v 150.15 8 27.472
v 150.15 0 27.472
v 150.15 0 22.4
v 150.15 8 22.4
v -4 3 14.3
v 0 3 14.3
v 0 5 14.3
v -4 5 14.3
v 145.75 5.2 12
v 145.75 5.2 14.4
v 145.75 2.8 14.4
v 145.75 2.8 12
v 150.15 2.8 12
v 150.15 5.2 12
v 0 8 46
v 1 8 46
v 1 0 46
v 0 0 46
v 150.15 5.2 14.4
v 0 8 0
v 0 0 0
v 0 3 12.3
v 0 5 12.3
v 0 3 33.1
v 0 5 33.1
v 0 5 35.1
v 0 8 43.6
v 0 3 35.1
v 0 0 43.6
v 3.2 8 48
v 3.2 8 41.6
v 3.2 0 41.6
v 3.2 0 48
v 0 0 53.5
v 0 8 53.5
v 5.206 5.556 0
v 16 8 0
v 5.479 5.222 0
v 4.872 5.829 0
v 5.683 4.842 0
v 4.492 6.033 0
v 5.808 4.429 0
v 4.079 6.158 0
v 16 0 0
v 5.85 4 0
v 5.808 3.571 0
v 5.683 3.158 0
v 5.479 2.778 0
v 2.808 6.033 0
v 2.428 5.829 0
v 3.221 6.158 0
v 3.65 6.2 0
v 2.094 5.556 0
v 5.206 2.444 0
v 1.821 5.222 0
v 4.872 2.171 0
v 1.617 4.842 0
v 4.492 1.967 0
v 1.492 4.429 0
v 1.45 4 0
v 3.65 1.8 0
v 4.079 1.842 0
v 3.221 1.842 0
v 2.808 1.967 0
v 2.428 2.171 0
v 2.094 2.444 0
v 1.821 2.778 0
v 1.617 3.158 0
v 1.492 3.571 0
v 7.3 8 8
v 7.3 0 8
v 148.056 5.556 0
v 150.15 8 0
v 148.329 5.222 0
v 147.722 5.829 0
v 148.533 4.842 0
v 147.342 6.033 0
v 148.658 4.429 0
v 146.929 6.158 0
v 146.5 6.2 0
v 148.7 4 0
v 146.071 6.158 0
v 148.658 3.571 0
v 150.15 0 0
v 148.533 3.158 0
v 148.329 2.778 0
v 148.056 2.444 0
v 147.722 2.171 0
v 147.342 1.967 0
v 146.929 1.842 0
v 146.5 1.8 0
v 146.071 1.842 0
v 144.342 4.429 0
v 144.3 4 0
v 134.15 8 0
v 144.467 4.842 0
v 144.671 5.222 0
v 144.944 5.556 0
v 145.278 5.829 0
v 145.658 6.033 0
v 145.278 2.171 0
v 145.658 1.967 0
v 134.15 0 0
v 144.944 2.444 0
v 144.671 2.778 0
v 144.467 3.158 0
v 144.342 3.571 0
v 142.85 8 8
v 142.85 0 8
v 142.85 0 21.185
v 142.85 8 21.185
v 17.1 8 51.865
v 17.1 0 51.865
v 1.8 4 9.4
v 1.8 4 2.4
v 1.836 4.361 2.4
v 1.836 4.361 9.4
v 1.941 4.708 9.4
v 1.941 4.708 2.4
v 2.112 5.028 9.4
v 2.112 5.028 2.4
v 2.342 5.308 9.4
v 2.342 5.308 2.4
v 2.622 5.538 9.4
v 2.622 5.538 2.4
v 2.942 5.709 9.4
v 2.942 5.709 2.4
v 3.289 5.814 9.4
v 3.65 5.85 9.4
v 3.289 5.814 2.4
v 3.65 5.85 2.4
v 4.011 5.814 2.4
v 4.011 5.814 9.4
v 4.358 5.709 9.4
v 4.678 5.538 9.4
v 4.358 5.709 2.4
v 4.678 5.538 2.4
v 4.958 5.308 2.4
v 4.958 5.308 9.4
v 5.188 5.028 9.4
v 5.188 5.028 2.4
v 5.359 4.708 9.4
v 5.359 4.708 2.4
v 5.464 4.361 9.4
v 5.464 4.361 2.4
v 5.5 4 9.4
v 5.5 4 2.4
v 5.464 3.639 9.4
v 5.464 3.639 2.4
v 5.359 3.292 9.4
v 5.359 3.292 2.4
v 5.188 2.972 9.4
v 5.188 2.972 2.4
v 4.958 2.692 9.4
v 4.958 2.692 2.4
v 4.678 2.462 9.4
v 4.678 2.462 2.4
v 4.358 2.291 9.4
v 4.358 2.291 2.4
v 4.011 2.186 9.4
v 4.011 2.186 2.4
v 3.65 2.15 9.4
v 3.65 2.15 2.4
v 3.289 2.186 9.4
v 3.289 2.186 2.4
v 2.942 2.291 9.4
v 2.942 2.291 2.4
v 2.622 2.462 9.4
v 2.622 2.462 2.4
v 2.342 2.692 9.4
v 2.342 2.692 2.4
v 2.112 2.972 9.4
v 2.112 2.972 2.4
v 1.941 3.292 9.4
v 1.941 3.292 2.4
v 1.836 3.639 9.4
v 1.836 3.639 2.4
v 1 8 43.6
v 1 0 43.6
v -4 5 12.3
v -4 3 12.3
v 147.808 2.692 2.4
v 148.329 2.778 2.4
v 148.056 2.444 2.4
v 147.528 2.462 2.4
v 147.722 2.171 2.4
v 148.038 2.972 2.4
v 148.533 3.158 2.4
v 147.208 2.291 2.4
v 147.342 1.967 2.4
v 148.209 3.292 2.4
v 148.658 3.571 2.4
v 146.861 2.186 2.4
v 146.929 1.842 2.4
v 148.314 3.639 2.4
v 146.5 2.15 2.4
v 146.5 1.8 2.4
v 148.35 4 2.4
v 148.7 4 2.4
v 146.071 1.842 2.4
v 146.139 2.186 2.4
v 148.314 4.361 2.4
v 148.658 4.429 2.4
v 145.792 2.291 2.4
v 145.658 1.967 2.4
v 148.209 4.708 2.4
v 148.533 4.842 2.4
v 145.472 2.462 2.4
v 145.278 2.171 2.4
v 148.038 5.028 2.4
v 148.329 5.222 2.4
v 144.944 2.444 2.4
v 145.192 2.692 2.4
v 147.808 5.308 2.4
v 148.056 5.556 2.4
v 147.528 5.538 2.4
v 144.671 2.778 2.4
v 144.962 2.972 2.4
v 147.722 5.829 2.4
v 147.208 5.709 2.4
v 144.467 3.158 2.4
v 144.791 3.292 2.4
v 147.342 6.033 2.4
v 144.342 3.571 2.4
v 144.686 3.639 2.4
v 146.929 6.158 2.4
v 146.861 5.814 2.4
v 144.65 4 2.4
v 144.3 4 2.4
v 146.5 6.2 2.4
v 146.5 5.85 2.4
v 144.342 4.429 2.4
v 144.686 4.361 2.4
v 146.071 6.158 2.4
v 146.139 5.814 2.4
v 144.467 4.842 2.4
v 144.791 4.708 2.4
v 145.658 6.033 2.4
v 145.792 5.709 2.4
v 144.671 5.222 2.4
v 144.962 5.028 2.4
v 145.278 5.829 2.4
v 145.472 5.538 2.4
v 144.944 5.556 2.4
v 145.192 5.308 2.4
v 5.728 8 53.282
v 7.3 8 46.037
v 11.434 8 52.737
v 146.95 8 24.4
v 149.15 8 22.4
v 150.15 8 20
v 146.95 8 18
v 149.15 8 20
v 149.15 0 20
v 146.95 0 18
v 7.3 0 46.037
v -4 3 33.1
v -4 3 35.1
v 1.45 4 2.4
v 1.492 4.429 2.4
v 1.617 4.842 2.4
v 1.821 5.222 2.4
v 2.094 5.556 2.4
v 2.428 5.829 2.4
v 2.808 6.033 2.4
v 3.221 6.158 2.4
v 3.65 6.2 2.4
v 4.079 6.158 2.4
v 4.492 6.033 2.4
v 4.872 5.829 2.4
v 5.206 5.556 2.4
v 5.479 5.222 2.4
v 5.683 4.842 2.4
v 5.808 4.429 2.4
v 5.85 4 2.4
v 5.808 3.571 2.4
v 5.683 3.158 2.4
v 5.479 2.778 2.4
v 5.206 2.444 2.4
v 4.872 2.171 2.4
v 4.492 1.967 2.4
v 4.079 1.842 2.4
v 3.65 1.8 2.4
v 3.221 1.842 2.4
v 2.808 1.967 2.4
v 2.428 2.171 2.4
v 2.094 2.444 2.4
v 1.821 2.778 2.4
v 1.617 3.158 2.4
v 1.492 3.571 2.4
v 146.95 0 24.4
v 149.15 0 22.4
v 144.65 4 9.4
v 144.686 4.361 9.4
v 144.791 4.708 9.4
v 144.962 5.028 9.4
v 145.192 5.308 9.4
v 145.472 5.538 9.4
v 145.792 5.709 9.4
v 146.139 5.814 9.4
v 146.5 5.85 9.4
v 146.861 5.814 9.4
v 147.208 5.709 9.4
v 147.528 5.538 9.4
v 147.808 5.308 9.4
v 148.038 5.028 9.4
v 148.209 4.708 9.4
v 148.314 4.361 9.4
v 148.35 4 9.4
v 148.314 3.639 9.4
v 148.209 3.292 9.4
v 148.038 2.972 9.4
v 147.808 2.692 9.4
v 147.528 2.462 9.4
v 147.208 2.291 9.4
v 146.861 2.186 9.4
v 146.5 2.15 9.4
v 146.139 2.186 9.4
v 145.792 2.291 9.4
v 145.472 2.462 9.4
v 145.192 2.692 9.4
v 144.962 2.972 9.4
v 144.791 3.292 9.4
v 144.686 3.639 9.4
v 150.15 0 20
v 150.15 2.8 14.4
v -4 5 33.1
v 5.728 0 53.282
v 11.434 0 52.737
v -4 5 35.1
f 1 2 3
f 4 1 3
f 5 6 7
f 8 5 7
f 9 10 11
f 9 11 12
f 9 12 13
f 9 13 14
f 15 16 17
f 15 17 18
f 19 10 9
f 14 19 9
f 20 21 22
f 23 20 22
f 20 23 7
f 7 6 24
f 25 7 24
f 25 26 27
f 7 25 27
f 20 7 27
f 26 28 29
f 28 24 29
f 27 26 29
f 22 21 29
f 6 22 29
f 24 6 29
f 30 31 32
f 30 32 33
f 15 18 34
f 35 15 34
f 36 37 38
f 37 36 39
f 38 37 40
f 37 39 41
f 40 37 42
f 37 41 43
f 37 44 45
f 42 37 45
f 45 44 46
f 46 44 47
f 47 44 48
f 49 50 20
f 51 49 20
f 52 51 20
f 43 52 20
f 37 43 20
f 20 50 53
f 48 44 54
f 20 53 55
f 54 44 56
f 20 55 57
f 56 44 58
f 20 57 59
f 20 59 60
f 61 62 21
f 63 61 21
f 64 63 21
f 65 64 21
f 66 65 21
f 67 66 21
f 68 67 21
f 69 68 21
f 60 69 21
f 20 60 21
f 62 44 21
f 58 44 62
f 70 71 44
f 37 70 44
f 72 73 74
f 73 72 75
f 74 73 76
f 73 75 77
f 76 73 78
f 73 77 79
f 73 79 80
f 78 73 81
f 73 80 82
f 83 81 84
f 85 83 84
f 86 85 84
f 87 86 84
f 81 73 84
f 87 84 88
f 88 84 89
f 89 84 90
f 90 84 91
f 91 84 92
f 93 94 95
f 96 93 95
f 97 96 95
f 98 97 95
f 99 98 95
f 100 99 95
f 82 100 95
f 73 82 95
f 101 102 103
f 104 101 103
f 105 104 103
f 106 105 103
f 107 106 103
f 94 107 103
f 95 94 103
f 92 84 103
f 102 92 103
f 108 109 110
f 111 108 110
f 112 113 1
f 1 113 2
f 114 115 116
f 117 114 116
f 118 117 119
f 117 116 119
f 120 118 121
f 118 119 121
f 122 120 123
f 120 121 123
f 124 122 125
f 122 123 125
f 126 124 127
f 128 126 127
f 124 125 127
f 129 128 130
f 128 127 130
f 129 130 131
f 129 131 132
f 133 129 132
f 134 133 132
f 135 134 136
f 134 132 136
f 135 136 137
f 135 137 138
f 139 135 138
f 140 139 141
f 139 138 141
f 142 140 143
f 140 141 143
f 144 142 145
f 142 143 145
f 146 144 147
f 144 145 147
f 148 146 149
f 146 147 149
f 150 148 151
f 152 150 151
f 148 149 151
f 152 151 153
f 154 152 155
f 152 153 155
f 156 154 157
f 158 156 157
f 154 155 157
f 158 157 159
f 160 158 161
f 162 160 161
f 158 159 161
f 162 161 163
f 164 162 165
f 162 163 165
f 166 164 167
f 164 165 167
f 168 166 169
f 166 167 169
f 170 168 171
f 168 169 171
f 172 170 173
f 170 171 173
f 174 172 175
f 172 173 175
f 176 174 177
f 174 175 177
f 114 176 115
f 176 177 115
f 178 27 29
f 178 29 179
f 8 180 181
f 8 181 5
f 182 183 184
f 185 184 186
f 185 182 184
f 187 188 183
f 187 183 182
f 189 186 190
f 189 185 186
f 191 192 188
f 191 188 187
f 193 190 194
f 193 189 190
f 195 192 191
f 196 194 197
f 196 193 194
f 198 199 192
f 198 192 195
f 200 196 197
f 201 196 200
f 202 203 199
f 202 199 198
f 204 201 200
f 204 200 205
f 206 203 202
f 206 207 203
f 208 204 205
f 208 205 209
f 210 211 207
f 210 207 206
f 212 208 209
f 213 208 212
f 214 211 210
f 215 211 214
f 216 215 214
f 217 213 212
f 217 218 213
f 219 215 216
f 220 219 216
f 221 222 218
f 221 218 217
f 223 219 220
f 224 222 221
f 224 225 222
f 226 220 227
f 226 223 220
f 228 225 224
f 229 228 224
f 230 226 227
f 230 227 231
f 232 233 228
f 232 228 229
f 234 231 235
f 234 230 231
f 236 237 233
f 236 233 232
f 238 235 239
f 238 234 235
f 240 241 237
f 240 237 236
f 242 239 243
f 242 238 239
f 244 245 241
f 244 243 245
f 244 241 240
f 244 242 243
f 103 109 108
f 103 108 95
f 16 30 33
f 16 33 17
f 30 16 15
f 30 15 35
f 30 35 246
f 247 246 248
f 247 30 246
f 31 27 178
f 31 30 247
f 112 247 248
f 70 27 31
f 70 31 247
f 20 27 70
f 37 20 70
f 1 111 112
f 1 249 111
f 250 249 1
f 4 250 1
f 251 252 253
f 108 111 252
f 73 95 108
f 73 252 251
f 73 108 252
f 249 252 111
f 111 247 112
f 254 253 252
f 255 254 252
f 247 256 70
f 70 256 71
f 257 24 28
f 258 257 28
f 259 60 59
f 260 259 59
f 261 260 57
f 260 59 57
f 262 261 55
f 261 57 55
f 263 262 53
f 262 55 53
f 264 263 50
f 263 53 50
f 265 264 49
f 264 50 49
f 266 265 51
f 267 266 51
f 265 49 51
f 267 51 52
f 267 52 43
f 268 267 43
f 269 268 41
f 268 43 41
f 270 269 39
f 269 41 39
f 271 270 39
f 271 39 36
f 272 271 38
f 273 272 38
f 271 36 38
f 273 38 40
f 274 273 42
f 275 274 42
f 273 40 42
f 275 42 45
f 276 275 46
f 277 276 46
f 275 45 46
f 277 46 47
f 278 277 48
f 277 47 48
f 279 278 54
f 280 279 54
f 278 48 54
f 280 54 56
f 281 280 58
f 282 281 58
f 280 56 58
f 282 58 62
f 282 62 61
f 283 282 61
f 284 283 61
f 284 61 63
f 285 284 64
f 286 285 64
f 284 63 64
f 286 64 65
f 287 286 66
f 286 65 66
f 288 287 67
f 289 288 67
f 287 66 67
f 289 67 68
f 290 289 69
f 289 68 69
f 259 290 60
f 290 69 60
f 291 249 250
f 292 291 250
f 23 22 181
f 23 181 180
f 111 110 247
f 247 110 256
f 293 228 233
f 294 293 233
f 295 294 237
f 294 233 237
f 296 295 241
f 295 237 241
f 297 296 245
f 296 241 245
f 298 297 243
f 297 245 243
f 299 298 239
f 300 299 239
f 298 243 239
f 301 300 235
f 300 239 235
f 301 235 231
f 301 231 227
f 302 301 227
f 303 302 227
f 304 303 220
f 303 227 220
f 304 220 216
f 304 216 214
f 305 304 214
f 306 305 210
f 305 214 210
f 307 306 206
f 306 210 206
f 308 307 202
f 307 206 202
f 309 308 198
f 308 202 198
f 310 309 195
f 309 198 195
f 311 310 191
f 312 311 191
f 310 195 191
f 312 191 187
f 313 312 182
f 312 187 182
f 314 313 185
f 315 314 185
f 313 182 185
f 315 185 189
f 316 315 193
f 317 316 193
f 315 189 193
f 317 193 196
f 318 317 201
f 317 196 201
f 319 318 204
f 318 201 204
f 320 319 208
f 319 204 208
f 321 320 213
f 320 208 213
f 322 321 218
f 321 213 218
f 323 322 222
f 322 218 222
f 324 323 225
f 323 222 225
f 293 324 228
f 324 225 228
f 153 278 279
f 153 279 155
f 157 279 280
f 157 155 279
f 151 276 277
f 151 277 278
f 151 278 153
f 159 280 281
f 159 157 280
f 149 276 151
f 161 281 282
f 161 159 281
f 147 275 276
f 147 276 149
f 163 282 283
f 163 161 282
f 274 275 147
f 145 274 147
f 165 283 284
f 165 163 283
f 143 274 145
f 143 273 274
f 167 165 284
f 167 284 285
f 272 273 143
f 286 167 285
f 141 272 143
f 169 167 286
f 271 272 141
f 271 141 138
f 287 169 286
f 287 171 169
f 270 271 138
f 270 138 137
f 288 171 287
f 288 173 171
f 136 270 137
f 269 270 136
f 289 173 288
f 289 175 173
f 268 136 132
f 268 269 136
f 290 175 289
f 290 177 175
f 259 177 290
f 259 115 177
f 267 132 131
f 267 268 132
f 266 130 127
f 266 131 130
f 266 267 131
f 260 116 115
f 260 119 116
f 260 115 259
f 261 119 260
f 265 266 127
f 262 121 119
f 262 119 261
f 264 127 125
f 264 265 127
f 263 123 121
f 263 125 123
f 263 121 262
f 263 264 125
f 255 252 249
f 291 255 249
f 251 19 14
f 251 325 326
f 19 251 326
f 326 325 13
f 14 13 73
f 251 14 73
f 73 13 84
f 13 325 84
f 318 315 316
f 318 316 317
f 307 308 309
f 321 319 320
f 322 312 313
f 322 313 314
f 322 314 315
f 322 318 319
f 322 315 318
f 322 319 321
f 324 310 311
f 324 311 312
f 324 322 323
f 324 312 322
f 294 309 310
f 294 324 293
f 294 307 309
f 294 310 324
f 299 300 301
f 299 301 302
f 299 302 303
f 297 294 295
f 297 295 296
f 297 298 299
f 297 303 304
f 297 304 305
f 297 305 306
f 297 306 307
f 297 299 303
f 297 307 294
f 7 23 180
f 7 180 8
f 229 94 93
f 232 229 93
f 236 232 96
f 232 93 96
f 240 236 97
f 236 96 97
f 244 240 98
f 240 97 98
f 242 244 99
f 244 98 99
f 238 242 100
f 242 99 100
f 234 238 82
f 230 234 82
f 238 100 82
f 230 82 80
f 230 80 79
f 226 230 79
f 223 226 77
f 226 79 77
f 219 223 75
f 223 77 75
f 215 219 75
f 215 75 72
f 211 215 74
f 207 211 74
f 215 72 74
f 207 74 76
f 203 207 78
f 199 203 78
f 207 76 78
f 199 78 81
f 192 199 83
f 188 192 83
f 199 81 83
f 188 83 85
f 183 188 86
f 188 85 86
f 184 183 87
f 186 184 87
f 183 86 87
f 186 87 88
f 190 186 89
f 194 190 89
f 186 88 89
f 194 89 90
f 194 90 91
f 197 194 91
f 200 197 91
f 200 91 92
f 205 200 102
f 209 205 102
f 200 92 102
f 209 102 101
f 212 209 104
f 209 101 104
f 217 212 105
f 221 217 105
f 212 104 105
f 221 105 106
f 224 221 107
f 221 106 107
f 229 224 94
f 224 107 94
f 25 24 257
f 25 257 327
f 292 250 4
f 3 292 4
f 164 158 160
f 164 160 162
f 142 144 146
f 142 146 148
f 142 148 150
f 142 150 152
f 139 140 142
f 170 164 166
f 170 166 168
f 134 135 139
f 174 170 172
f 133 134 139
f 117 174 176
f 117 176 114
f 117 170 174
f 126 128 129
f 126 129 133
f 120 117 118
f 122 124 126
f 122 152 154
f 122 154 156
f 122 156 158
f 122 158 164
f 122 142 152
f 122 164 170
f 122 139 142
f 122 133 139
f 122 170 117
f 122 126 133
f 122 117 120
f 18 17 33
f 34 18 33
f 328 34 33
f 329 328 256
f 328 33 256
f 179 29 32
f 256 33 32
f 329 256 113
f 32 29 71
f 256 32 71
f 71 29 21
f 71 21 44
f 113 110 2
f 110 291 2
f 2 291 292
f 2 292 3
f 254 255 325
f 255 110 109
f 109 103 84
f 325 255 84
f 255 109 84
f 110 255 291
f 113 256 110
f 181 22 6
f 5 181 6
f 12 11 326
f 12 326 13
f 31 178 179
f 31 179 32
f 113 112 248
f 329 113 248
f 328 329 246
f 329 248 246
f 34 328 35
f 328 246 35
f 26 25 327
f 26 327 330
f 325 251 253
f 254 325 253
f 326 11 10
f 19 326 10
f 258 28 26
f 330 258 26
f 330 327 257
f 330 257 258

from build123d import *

# Parameters (mm, degrees)
P_IDAT_VYSUNUT_M1_DEPTH  = 8
ODEBRAT_VYSUNUT_M1_DEPTH = 161.106285011
SKICA3_W                 = 2
SKICA3_H                 = 2
P_IDAT_VYSUNUT_M2_DEPTH  = 4
SKICA5_W                 = 16
SKICA5_H                 = 8
P_IDAT_VYSUNUT_M3_DEPTH  = 8
ODEBRAT_VYSUNUT_M4_DEPTH = 161.106285011
SKICA4_W                 = 2.4
SKICA4_H                 = 2.4
ODEBRAT_VYSUNUT_M2_DEPTH = 4.4
ODEBRAT_VYSUNUT_M5_DEPTH = 161.106285011
ODEBRAT_VYSUNUT_M6_DEPTH = 161.106285011
ZAOBLIT1_R               = 100
SKICA11_R                = 2.2
ODEBRAT_VYSUNUT_M7_DEPTH = 2.4
SKICA12_R                = 1.85
ODEBRAT_VYSUNUT_M8_DEPTH = 7


with BuildPart() as part:
    # Skica1 → Přidat vysunutím1 (new body)
    with BuildSketch(Plane(origin=(0, 0, 0), x_dir=(1, 0, 0), z_dir=(0, 1, 0))):
        Polygon((0, 0), (0, -55), (150.15, -27.472114866), (150.15, 0), (142.85, 0), (142.85, -21.185463454), (7.3, -46.036644473), (7.3, 0), align=None)
    extrude(amount=P_IDAT_VYSUNUT_M1_DEPTH)

    # Skica2 → Odebrat vysunutím1 (cut, through all)
    with BuildSketch(Plane(origin=(0, 8, 0), x_dir=(1, 0, 0), z_dir=(0, 1, 0))):
        Polygon((0, -43.6), (1, -43.6), (3.2, -41.6), (3.2, -48), (1, -46), (0, -46), align=None)
    extrude(amount=-ODEBRAT_VYSUNUT_M1_DEPTH, mode=Mode.SUBTRACT)

    # Skica3 → Přidat vysunutím2 (add)
    with BuildSketch(Plane.ZY):
        with Locations((13.3, 4)):
            Rectangle(SKICA3_W, SKICA3_H)
        with Locations((34.1, 4)):
            Rectangle(SKICA3_W, SKICA3_H)
    extrude(amount=P_IDAT_VYSUNUT_M2_DEPTH)

    # Skica5 → Přidat vysunutím3 (add)
    with BuildSketch(Plane(origin=(0, 8, 0), x_dir=(1, 0, 0), z_dir=(0, 1, 0))):
        with Locations((8, -4)):
            Rectangle(SKICA5_W, SKICA5_H)
        with Locations((142.15, -4)):
            Rectangle(SKICA5_W, SKICA5_H)
    extrude(amount=-P_IDAT_VYSUNUT_M3_DEPTH)

    # Skica7 → Odebrat vysunutím4 (cut, through all)
    with BuildSketch(Plane.XZ):
        Polygon((7.3, 8), (16, 0), (16, 8), align=None)
        Polygon((134.15, 0), (134.15, 8), (142.85, 8), align=None)
    extrude(amount=-ODEBRAT_VYSUNUT_M4_DEPTH, mode=Mode.SUBTRACT)

    # Skica4 → Odebrat vysunutím2 (cut)
    with BuildSketch(Plane(origin=(150.15, 0, 0), x_dir=(0, 0, -1), z_dir=(1, 0, 0))):
        with Locations((-13.2, 4)):
            Rectangle(SKICA4_W, SKICA4_H)
    extrude(amount=-ODEBRAT_VYSUNUT_M2_DEPTH, mode=Mode.SUBTRACT)

    # Skica8 → Odebrat vysunutím5 (cut, through all)
    with BuildSketch(Plane(origin=(0, 8, 0), x_dir=(1, 0, 0), z_dir=(0, 1, 0))):
        Polygon((150.15, -20), (149.15, -20), (146.95, -18), (146.95, -24.4), (149.15, -22.4), (150.15, -22.4), align=None)
    extrude(amount=-ODEBRAT_VYSUNUT_M5_DEPTH, mode=Mode.SUBTRACT)

    # Skica9 → Odebrat vysunutím6 (cut, through all)
    with BuildSketch(Plane(origin=(0, 8, 0), x_dir=(1, 0, 0), z_dir=(0, 1, 0))):
        Polygon((0, -53.5), (8.181703712, -53.5), (0, -55), align=None)
    extrude(amount=-ODEBRAT_VYSUNUT_M6_DEPTH, mode=Mode.SUBTRACT)

    # Zaoblit1
    # the kernel refuses this fillet: 100 mm, written as the material it takes off along each edge
    with BuildSketch(Plane(origin=(8.181703712, 30.667234564, 53.5), x_dir=(0.9836061098745081, 0, -0.18033030975833525), z_dir=(0, -1, 0))) as zaoblit1_piece_1:
        with BuildLine():
            CenterArc((9.066893825, -100), ZAOBLIT1_R, 90, 9.854379591)
            Line((-8.047573761, -1.475409165), (-8.389863112, 0.495082652))
            ThreePointArc((-8.389863112, 0.495082652), (-4.3844475, 1.229507637), (-0.36066062, 1.96721222))
            Line((-0.36066062, 1.96721222), (0, 2))
            Line((0, 2), (9.066893825, 2))
            Line((9.066893825, 2), (9.066893825, 0))
        make_face()
    extrude(amount=53.334469127, mode=Mode.SUBTRACT)

    # Skica11 → Odebrat vysunutím7 (cut)
    with BuildSketch(Plane(origin=(0, 0, 0), x_dir=(-1, 0, 0), z_dir=(0, 0, -1))):
        with Locations((-146.5, 4)):
            Circle(SKICA11_R)
        with Locations((-3.65, 4)):
            Circle(SKICA11_R)
    extrude(amount=-ODEBRAT_VYSUNUT_M7_DEPTH, mode=Mode.SUBTRACT)

    # Skica12 → Odebrat vysunutím8 (cut)
    with BuildSketch(Plane(origin=(0, 0, 2.4), x_dir=(-1, 0, 0), z_dir=(0, 0, -1))):
        with Locations((-146.5, 4)):
            Circle(SKICA12_R)
        with Locations((-3.65, 4)):
            Circle(SKICA12_R)
    extrude(amount=-ODEBRAT_VYSUNUT_M8_DEPTH, mode=Mode.SUBTRACT)


solid = part.part
